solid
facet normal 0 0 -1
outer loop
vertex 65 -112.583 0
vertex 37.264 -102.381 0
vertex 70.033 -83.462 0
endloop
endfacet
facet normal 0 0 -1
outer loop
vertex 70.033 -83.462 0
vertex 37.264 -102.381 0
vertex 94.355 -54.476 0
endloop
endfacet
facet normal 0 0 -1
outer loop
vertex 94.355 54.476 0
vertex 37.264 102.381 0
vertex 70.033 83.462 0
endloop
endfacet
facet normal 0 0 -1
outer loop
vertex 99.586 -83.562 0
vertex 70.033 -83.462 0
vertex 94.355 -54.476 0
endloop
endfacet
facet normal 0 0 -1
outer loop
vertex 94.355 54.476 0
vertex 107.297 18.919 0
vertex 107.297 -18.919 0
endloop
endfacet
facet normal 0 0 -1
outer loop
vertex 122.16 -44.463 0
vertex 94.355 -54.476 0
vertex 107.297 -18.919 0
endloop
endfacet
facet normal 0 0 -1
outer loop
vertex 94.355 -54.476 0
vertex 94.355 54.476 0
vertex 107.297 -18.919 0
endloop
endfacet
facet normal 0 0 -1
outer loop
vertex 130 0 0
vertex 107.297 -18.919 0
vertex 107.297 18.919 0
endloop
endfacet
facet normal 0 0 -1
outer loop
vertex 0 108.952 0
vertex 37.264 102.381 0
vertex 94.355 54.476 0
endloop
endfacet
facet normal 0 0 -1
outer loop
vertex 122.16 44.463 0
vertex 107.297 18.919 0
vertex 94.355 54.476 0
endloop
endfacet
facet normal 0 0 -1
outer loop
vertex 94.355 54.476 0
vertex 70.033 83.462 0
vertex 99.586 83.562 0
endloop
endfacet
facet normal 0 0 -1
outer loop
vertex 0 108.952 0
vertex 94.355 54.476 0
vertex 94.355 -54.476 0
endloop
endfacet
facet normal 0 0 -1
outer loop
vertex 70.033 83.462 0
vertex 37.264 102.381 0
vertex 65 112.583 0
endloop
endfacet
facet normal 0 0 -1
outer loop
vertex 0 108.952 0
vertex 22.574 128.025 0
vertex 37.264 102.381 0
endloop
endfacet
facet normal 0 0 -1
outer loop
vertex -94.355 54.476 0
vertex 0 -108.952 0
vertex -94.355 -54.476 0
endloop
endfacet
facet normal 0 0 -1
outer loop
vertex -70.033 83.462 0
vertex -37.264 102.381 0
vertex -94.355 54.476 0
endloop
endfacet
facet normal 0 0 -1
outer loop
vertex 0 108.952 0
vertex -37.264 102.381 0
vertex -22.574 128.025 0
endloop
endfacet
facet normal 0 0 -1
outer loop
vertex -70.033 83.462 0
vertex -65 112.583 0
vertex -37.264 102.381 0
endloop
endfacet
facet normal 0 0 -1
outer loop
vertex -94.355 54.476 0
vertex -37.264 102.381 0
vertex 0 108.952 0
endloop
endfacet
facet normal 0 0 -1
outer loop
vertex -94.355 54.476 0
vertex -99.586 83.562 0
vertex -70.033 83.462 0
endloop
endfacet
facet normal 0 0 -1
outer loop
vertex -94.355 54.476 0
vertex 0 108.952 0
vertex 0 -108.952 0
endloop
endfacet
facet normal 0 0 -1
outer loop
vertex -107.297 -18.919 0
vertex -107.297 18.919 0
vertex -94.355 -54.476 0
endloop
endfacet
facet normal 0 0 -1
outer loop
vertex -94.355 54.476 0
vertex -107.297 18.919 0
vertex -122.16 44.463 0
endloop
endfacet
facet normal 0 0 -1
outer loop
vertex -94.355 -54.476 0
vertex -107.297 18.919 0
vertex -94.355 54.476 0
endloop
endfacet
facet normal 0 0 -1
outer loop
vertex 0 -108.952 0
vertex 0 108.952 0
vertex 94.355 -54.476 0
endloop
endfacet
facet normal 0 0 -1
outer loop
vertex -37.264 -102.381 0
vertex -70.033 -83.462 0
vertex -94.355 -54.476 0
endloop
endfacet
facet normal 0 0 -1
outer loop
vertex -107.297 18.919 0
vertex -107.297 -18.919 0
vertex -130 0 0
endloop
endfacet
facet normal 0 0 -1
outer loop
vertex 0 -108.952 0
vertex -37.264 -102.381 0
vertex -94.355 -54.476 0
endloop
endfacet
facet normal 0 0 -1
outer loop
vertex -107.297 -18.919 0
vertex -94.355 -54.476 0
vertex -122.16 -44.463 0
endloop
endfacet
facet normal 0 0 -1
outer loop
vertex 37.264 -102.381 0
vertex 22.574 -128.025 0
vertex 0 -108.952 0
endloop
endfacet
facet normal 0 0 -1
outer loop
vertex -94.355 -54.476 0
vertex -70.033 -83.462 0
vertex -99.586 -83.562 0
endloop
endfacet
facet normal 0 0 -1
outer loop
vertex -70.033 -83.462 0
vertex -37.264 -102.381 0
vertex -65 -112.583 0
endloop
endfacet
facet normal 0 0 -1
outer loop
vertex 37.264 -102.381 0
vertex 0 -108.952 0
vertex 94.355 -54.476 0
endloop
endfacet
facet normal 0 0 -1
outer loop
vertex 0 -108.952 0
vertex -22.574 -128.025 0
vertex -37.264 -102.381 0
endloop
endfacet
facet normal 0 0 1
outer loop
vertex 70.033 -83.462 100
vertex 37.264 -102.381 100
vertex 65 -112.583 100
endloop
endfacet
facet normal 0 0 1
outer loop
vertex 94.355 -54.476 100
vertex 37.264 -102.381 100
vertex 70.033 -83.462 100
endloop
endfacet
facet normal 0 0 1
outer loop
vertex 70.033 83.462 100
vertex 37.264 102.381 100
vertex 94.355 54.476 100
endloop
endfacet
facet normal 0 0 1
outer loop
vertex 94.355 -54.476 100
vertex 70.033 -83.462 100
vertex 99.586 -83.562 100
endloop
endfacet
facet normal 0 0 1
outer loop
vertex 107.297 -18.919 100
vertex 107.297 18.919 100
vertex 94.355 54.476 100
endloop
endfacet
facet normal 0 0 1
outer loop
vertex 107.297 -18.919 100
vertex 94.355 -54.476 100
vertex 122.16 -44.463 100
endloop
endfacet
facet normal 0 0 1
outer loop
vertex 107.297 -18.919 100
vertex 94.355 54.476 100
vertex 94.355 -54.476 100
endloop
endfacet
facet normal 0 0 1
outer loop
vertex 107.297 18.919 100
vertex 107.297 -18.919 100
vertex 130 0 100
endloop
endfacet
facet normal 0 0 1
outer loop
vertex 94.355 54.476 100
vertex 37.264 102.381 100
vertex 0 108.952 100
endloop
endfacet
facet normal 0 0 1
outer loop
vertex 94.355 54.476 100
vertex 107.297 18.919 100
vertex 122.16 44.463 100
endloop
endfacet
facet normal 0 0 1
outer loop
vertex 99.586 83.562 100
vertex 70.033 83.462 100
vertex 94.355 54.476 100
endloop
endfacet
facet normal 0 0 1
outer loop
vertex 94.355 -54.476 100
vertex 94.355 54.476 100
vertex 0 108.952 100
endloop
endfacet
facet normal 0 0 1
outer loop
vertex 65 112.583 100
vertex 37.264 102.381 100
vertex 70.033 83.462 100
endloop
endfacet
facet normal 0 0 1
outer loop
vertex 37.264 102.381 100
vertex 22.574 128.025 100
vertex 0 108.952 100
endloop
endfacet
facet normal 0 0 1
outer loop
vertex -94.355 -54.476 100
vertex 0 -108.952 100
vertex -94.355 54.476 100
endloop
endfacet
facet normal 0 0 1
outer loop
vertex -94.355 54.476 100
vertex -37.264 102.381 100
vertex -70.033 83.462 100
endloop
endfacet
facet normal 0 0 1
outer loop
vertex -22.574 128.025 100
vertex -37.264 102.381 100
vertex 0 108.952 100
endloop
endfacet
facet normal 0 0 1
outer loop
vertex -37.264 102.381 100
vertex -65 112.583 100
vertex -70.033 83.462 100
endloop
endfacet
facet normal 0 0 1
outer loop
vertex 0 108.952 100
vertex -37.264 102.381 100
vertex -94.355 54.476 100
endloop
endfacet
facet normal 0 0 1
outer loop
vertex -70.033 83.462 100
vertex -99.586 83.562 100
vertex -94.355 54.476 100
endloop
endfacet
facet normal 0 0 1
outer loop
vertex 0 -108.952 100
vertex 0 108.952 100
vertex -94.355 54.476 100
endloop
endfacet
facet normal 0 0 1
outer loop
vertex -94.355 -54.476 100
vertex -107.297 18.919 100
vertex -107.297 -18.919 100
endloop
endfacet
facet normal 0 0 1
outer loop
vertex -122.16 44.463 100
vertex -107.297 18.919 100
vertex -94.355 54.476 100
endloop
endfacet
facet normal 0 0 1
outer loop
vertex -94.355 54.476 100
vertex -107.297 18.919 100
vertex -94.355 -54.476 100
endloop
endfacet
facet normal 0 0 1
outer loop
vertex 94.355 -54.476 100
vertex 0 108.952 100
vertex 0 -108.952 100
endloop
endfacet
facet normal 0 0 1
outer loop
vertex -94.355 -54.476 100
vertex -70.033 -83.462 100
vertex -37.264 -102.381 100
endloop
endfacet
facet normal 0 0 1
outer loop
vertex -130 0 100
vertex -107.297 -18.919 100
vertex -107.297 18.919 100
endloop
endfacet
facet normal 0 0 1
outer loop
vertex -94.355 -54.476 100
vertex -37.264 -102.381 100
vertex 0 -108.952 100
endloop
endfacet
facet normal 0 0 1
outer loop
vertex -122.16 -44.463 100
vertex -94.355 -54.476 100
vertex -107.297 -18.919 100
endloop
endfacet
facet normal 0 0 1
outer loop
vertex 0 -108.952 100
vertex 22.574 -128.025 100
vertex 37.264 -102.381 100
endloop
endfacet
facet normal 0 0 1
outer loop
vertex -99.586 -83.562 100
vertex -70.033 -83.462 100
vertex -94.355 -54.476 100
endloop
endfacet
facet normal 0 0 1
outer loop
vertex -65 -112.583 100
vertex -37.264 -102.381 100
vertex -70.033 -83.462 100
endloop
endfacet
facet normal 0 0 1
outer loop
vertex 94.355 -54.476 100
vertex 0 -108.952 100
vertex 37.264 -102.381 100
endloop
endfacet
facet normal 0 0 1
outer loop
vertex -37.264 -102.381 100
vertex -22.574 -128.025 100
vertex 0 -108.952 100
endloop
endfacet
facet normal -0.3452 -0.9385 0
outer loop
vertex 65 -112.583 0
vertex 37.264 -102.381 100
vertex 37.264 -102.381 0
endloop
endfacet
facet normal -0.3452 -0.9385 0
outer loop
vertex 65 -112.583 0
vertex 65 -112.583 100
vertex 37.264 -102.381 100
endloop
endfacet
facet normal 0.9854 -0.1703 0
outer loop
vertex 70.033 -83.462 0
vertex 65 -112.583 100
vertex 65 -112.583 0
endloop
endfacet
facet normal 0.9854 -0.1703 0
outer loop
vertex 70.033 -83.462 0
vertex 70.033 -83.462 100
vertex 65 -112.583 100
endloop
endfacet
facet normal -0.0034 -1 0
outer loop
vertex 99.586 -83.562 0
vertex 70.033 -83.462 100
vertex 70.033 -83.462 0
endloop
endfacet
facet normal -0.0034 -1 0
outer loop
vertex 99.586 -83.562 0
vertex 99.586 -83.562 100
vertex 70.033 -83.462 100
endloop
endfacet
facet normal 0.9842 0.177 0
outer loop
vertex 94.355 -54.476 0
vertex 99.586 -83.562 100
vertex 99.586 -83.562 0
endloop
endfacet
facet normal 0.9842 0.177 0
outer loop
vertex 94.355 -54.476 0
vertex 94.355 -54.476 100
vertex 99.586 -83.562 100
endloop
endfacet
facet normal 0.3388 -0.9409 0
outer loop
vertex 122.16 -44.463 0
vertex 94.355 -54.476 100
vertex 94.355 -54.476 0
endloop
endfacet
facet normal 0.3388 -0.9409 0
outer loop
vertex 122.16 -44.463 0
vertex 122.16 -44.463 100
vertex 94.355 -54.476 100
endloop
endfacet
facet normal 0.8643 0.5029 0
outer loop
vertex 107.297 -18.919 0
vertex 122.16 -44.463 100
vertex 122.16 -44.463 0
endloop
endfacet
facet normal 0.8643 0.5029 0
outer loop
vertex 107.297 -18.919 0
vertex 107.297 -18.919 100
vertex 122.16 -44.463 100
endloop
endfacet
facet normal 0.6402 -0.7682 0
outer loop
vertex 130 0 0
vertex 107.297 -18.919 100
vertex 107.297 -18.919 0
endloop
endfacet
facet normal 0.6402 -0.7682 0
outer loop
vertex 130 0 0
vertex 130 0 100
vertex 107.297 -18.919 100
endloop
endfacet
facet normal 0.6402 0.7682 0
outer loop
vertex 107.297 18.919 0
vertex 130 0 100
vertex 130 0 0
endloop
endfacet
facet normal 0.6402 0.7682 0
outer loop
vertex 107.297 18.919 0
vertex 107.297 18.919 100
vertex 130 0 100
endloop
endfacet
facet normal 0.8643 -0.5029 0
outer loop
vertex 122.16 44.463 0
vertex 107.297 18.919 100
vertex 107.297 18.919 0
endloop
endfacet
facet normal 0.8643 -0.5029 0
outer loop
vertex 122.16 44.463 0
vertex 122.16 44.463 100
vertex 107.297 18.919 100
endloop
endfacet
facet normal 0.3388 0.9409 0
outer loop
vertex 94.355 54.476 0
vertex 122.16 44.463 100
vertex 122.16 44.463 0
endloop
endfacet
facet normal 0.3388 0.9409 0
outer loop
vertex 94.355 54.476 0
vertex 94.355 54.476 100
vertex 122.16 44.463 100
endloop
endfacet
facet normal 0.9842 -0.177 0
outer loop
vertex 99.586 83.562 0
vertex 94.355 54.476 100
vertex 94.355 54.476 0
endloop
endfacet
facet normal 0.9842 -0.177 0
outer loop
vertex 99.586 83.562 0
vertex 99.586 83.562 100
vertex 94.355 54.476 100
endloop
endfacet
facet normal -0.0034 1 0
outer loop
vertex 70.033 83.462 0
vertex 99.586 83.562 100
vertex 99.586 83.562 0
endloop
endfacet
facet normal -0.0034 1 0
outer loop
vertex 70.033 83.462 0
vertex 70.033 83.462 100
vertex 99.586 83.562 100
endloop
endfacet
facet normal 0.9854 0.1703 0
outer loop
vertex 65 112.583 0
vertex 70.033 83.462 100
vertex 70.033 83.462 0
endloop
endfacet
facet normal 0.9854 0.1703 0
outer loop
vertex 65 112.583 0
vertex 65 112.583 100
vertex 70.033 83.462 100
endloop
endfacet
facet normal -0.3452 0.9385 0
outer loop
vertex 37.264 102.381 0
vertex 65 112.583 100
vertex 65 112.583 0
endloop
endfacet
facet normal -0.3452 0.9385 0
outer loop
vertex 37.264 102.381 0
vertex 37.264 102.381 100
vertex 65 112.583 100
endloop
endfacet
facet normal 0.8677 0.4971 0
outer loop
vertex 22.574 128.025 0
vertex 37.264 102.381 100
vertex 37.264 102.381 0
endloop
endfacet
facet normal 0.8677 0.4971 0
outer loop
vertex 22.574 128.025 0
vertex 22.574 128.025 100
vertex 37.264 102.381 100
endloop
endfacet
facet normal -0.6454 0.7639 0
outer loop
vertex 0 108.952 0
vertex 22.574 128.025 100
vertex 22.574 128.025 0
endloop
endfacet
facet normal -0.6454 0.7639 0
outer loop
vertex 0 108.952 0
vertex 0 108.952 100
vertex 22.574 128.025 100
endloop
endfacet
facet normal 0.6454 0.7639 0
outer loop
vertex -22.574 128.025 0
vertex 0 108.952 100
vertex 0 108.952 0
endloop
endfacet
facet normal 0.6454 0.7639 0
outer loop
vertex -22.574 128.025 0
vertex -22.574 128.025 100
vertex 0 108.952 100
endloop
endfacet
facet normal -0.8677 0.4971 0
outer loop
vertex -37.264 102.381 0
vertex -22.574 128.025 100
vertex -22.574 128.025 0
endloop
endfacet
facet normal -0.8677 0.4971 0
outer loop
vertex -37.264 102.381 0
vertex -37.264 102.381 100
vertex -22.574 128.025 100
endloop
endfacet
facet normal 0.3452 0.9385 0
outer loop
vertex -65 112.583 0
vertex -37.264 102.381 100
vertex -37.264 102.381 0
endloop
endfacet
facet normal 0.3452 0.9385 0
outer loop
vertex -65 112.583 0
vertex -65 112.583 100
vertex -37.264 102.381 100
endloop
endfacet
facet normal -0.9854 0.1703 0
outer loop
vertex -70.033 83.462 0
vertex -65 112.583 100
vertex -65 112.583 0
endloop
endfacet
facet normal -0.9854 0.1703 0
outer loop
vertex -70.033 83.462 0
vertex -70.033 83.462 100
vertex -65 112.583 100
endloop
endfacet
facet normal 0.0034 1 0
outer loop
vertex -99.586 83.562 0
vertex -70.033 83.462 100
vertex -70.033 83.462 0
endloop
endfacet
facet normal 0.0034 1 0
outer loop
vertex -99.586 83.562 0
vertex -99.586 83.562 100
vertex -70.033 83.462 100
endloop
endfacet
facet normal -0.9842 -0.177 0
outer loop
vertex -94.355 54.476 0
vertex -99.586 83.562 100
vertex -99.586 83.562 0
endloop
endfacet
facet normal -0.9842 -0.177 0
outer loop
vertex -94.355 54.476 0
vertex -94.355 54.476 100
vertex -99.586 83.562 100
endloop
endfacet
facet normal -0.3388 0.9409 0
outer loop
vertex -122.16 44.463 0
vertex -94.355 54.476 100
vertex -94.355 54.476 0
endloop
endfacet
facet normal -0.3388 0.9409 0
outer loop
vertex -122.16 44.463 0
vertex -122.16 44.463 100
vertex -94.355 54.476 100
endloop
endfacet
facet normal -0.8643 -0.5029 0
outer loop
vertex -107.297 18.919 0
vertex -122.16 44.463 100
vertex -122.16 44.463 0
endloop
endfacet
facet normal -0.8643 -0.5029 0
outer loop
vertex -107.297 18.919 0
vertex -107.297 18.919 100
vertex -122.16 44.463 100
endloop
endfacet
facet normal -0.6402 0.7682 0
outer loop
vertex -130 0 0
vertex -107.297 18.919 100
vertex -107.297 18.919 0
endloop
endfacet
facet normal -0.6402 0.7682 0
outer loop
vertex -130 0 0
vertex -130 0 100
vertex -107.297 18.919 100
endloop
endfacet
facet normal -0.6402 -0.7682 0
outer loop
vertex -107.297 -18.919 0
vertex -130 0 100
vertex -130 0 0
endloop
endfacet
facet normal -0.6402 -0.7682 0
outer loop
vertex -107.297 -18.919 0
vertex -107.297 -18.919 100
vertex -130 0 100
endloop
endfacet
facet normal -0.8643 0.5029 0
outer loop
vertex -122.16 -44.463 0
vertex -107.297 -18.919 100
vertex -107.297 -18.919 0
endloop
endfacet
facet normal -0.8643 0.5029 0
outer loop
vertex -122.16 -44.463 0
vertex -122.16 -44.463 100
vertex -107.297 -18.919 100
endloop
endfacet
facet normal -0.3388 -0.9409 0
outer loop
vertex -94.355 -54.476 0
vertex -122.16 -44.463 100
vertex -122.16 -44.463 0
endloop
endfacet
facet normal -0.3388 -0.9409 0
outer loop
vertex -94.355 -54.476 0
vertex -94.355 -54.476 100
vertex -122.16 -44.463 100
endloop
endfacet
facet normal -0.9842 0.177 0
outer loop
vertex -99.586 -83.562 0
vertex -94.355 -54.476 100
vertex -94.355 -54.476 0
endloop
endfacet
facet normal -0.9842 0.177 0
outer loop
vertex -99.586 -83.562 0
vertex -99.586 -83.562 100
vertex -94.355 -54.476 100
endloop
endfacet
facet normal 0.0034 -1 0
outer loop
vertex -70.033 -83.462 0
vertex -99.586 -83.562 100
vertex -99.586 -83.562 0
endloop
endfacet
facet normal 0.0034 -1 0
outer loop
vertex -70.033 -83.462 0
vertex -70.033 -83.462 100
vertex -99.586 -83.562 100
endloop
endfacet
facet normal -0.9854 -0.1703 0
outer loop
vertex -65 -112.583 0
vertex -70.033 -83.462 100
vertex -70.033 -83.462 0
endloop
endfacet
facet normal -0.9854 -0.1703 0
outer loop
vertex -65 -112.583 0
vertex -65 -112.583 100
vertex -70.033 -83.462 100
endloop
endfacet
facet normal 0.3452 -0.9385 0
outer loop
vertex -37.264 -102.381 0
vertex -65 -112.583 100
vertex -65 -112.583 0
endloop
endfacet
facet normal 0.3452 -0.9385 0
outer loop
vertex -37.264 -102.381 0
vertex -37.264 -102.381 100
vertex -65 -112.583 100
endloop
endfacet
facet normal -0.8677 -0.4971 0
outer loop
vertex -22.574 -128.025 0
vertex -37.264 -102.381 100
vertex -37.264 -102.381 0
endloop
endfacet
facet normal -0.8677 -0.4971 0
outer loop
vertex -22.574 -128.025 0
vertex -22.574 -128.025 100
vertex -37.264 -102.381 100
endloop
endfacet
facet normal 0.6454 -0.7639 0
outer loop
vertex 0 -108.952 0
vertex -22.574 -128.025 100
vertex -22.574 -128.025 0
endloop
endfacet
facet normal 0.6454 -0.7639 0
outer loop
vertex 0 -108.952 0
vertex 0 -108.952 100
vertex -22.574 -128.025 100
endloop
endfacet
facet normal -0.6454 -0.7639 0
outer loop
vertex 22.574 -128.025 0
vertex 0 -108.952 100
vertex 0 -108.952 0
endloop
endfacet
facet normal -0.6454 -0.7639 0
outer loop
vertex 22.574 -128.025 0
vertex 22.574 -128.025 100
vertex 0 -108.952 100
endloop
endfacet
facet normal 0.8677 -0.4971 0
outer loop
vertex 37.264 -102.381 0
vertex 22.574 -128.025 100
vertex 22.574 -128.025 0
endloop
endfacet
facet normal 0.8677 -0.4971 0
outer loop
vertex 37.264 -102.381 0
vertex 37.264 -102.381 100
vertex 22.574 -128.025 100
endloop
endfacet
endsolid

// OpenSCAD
//1个2D牙
module tooth_2d(bodylen=100,bodywidth=50,headlen=30){
	translate([0,-bodywidth/2,0])
	{
		polygon(points=[[0,0],[bodylen,0],[bodylen+headlen,bodywidth/2],[bodylen,bodywidth],[0,bodywidth]]);
	}
}

//循环生成18个2D牙并拉高
linear_extrude(height = 100, twist =0, scale = 1, center = false)
{
	for (i = [0:18]) {
					rotate([0,0,20*i])tooth_2d();
	}
}
